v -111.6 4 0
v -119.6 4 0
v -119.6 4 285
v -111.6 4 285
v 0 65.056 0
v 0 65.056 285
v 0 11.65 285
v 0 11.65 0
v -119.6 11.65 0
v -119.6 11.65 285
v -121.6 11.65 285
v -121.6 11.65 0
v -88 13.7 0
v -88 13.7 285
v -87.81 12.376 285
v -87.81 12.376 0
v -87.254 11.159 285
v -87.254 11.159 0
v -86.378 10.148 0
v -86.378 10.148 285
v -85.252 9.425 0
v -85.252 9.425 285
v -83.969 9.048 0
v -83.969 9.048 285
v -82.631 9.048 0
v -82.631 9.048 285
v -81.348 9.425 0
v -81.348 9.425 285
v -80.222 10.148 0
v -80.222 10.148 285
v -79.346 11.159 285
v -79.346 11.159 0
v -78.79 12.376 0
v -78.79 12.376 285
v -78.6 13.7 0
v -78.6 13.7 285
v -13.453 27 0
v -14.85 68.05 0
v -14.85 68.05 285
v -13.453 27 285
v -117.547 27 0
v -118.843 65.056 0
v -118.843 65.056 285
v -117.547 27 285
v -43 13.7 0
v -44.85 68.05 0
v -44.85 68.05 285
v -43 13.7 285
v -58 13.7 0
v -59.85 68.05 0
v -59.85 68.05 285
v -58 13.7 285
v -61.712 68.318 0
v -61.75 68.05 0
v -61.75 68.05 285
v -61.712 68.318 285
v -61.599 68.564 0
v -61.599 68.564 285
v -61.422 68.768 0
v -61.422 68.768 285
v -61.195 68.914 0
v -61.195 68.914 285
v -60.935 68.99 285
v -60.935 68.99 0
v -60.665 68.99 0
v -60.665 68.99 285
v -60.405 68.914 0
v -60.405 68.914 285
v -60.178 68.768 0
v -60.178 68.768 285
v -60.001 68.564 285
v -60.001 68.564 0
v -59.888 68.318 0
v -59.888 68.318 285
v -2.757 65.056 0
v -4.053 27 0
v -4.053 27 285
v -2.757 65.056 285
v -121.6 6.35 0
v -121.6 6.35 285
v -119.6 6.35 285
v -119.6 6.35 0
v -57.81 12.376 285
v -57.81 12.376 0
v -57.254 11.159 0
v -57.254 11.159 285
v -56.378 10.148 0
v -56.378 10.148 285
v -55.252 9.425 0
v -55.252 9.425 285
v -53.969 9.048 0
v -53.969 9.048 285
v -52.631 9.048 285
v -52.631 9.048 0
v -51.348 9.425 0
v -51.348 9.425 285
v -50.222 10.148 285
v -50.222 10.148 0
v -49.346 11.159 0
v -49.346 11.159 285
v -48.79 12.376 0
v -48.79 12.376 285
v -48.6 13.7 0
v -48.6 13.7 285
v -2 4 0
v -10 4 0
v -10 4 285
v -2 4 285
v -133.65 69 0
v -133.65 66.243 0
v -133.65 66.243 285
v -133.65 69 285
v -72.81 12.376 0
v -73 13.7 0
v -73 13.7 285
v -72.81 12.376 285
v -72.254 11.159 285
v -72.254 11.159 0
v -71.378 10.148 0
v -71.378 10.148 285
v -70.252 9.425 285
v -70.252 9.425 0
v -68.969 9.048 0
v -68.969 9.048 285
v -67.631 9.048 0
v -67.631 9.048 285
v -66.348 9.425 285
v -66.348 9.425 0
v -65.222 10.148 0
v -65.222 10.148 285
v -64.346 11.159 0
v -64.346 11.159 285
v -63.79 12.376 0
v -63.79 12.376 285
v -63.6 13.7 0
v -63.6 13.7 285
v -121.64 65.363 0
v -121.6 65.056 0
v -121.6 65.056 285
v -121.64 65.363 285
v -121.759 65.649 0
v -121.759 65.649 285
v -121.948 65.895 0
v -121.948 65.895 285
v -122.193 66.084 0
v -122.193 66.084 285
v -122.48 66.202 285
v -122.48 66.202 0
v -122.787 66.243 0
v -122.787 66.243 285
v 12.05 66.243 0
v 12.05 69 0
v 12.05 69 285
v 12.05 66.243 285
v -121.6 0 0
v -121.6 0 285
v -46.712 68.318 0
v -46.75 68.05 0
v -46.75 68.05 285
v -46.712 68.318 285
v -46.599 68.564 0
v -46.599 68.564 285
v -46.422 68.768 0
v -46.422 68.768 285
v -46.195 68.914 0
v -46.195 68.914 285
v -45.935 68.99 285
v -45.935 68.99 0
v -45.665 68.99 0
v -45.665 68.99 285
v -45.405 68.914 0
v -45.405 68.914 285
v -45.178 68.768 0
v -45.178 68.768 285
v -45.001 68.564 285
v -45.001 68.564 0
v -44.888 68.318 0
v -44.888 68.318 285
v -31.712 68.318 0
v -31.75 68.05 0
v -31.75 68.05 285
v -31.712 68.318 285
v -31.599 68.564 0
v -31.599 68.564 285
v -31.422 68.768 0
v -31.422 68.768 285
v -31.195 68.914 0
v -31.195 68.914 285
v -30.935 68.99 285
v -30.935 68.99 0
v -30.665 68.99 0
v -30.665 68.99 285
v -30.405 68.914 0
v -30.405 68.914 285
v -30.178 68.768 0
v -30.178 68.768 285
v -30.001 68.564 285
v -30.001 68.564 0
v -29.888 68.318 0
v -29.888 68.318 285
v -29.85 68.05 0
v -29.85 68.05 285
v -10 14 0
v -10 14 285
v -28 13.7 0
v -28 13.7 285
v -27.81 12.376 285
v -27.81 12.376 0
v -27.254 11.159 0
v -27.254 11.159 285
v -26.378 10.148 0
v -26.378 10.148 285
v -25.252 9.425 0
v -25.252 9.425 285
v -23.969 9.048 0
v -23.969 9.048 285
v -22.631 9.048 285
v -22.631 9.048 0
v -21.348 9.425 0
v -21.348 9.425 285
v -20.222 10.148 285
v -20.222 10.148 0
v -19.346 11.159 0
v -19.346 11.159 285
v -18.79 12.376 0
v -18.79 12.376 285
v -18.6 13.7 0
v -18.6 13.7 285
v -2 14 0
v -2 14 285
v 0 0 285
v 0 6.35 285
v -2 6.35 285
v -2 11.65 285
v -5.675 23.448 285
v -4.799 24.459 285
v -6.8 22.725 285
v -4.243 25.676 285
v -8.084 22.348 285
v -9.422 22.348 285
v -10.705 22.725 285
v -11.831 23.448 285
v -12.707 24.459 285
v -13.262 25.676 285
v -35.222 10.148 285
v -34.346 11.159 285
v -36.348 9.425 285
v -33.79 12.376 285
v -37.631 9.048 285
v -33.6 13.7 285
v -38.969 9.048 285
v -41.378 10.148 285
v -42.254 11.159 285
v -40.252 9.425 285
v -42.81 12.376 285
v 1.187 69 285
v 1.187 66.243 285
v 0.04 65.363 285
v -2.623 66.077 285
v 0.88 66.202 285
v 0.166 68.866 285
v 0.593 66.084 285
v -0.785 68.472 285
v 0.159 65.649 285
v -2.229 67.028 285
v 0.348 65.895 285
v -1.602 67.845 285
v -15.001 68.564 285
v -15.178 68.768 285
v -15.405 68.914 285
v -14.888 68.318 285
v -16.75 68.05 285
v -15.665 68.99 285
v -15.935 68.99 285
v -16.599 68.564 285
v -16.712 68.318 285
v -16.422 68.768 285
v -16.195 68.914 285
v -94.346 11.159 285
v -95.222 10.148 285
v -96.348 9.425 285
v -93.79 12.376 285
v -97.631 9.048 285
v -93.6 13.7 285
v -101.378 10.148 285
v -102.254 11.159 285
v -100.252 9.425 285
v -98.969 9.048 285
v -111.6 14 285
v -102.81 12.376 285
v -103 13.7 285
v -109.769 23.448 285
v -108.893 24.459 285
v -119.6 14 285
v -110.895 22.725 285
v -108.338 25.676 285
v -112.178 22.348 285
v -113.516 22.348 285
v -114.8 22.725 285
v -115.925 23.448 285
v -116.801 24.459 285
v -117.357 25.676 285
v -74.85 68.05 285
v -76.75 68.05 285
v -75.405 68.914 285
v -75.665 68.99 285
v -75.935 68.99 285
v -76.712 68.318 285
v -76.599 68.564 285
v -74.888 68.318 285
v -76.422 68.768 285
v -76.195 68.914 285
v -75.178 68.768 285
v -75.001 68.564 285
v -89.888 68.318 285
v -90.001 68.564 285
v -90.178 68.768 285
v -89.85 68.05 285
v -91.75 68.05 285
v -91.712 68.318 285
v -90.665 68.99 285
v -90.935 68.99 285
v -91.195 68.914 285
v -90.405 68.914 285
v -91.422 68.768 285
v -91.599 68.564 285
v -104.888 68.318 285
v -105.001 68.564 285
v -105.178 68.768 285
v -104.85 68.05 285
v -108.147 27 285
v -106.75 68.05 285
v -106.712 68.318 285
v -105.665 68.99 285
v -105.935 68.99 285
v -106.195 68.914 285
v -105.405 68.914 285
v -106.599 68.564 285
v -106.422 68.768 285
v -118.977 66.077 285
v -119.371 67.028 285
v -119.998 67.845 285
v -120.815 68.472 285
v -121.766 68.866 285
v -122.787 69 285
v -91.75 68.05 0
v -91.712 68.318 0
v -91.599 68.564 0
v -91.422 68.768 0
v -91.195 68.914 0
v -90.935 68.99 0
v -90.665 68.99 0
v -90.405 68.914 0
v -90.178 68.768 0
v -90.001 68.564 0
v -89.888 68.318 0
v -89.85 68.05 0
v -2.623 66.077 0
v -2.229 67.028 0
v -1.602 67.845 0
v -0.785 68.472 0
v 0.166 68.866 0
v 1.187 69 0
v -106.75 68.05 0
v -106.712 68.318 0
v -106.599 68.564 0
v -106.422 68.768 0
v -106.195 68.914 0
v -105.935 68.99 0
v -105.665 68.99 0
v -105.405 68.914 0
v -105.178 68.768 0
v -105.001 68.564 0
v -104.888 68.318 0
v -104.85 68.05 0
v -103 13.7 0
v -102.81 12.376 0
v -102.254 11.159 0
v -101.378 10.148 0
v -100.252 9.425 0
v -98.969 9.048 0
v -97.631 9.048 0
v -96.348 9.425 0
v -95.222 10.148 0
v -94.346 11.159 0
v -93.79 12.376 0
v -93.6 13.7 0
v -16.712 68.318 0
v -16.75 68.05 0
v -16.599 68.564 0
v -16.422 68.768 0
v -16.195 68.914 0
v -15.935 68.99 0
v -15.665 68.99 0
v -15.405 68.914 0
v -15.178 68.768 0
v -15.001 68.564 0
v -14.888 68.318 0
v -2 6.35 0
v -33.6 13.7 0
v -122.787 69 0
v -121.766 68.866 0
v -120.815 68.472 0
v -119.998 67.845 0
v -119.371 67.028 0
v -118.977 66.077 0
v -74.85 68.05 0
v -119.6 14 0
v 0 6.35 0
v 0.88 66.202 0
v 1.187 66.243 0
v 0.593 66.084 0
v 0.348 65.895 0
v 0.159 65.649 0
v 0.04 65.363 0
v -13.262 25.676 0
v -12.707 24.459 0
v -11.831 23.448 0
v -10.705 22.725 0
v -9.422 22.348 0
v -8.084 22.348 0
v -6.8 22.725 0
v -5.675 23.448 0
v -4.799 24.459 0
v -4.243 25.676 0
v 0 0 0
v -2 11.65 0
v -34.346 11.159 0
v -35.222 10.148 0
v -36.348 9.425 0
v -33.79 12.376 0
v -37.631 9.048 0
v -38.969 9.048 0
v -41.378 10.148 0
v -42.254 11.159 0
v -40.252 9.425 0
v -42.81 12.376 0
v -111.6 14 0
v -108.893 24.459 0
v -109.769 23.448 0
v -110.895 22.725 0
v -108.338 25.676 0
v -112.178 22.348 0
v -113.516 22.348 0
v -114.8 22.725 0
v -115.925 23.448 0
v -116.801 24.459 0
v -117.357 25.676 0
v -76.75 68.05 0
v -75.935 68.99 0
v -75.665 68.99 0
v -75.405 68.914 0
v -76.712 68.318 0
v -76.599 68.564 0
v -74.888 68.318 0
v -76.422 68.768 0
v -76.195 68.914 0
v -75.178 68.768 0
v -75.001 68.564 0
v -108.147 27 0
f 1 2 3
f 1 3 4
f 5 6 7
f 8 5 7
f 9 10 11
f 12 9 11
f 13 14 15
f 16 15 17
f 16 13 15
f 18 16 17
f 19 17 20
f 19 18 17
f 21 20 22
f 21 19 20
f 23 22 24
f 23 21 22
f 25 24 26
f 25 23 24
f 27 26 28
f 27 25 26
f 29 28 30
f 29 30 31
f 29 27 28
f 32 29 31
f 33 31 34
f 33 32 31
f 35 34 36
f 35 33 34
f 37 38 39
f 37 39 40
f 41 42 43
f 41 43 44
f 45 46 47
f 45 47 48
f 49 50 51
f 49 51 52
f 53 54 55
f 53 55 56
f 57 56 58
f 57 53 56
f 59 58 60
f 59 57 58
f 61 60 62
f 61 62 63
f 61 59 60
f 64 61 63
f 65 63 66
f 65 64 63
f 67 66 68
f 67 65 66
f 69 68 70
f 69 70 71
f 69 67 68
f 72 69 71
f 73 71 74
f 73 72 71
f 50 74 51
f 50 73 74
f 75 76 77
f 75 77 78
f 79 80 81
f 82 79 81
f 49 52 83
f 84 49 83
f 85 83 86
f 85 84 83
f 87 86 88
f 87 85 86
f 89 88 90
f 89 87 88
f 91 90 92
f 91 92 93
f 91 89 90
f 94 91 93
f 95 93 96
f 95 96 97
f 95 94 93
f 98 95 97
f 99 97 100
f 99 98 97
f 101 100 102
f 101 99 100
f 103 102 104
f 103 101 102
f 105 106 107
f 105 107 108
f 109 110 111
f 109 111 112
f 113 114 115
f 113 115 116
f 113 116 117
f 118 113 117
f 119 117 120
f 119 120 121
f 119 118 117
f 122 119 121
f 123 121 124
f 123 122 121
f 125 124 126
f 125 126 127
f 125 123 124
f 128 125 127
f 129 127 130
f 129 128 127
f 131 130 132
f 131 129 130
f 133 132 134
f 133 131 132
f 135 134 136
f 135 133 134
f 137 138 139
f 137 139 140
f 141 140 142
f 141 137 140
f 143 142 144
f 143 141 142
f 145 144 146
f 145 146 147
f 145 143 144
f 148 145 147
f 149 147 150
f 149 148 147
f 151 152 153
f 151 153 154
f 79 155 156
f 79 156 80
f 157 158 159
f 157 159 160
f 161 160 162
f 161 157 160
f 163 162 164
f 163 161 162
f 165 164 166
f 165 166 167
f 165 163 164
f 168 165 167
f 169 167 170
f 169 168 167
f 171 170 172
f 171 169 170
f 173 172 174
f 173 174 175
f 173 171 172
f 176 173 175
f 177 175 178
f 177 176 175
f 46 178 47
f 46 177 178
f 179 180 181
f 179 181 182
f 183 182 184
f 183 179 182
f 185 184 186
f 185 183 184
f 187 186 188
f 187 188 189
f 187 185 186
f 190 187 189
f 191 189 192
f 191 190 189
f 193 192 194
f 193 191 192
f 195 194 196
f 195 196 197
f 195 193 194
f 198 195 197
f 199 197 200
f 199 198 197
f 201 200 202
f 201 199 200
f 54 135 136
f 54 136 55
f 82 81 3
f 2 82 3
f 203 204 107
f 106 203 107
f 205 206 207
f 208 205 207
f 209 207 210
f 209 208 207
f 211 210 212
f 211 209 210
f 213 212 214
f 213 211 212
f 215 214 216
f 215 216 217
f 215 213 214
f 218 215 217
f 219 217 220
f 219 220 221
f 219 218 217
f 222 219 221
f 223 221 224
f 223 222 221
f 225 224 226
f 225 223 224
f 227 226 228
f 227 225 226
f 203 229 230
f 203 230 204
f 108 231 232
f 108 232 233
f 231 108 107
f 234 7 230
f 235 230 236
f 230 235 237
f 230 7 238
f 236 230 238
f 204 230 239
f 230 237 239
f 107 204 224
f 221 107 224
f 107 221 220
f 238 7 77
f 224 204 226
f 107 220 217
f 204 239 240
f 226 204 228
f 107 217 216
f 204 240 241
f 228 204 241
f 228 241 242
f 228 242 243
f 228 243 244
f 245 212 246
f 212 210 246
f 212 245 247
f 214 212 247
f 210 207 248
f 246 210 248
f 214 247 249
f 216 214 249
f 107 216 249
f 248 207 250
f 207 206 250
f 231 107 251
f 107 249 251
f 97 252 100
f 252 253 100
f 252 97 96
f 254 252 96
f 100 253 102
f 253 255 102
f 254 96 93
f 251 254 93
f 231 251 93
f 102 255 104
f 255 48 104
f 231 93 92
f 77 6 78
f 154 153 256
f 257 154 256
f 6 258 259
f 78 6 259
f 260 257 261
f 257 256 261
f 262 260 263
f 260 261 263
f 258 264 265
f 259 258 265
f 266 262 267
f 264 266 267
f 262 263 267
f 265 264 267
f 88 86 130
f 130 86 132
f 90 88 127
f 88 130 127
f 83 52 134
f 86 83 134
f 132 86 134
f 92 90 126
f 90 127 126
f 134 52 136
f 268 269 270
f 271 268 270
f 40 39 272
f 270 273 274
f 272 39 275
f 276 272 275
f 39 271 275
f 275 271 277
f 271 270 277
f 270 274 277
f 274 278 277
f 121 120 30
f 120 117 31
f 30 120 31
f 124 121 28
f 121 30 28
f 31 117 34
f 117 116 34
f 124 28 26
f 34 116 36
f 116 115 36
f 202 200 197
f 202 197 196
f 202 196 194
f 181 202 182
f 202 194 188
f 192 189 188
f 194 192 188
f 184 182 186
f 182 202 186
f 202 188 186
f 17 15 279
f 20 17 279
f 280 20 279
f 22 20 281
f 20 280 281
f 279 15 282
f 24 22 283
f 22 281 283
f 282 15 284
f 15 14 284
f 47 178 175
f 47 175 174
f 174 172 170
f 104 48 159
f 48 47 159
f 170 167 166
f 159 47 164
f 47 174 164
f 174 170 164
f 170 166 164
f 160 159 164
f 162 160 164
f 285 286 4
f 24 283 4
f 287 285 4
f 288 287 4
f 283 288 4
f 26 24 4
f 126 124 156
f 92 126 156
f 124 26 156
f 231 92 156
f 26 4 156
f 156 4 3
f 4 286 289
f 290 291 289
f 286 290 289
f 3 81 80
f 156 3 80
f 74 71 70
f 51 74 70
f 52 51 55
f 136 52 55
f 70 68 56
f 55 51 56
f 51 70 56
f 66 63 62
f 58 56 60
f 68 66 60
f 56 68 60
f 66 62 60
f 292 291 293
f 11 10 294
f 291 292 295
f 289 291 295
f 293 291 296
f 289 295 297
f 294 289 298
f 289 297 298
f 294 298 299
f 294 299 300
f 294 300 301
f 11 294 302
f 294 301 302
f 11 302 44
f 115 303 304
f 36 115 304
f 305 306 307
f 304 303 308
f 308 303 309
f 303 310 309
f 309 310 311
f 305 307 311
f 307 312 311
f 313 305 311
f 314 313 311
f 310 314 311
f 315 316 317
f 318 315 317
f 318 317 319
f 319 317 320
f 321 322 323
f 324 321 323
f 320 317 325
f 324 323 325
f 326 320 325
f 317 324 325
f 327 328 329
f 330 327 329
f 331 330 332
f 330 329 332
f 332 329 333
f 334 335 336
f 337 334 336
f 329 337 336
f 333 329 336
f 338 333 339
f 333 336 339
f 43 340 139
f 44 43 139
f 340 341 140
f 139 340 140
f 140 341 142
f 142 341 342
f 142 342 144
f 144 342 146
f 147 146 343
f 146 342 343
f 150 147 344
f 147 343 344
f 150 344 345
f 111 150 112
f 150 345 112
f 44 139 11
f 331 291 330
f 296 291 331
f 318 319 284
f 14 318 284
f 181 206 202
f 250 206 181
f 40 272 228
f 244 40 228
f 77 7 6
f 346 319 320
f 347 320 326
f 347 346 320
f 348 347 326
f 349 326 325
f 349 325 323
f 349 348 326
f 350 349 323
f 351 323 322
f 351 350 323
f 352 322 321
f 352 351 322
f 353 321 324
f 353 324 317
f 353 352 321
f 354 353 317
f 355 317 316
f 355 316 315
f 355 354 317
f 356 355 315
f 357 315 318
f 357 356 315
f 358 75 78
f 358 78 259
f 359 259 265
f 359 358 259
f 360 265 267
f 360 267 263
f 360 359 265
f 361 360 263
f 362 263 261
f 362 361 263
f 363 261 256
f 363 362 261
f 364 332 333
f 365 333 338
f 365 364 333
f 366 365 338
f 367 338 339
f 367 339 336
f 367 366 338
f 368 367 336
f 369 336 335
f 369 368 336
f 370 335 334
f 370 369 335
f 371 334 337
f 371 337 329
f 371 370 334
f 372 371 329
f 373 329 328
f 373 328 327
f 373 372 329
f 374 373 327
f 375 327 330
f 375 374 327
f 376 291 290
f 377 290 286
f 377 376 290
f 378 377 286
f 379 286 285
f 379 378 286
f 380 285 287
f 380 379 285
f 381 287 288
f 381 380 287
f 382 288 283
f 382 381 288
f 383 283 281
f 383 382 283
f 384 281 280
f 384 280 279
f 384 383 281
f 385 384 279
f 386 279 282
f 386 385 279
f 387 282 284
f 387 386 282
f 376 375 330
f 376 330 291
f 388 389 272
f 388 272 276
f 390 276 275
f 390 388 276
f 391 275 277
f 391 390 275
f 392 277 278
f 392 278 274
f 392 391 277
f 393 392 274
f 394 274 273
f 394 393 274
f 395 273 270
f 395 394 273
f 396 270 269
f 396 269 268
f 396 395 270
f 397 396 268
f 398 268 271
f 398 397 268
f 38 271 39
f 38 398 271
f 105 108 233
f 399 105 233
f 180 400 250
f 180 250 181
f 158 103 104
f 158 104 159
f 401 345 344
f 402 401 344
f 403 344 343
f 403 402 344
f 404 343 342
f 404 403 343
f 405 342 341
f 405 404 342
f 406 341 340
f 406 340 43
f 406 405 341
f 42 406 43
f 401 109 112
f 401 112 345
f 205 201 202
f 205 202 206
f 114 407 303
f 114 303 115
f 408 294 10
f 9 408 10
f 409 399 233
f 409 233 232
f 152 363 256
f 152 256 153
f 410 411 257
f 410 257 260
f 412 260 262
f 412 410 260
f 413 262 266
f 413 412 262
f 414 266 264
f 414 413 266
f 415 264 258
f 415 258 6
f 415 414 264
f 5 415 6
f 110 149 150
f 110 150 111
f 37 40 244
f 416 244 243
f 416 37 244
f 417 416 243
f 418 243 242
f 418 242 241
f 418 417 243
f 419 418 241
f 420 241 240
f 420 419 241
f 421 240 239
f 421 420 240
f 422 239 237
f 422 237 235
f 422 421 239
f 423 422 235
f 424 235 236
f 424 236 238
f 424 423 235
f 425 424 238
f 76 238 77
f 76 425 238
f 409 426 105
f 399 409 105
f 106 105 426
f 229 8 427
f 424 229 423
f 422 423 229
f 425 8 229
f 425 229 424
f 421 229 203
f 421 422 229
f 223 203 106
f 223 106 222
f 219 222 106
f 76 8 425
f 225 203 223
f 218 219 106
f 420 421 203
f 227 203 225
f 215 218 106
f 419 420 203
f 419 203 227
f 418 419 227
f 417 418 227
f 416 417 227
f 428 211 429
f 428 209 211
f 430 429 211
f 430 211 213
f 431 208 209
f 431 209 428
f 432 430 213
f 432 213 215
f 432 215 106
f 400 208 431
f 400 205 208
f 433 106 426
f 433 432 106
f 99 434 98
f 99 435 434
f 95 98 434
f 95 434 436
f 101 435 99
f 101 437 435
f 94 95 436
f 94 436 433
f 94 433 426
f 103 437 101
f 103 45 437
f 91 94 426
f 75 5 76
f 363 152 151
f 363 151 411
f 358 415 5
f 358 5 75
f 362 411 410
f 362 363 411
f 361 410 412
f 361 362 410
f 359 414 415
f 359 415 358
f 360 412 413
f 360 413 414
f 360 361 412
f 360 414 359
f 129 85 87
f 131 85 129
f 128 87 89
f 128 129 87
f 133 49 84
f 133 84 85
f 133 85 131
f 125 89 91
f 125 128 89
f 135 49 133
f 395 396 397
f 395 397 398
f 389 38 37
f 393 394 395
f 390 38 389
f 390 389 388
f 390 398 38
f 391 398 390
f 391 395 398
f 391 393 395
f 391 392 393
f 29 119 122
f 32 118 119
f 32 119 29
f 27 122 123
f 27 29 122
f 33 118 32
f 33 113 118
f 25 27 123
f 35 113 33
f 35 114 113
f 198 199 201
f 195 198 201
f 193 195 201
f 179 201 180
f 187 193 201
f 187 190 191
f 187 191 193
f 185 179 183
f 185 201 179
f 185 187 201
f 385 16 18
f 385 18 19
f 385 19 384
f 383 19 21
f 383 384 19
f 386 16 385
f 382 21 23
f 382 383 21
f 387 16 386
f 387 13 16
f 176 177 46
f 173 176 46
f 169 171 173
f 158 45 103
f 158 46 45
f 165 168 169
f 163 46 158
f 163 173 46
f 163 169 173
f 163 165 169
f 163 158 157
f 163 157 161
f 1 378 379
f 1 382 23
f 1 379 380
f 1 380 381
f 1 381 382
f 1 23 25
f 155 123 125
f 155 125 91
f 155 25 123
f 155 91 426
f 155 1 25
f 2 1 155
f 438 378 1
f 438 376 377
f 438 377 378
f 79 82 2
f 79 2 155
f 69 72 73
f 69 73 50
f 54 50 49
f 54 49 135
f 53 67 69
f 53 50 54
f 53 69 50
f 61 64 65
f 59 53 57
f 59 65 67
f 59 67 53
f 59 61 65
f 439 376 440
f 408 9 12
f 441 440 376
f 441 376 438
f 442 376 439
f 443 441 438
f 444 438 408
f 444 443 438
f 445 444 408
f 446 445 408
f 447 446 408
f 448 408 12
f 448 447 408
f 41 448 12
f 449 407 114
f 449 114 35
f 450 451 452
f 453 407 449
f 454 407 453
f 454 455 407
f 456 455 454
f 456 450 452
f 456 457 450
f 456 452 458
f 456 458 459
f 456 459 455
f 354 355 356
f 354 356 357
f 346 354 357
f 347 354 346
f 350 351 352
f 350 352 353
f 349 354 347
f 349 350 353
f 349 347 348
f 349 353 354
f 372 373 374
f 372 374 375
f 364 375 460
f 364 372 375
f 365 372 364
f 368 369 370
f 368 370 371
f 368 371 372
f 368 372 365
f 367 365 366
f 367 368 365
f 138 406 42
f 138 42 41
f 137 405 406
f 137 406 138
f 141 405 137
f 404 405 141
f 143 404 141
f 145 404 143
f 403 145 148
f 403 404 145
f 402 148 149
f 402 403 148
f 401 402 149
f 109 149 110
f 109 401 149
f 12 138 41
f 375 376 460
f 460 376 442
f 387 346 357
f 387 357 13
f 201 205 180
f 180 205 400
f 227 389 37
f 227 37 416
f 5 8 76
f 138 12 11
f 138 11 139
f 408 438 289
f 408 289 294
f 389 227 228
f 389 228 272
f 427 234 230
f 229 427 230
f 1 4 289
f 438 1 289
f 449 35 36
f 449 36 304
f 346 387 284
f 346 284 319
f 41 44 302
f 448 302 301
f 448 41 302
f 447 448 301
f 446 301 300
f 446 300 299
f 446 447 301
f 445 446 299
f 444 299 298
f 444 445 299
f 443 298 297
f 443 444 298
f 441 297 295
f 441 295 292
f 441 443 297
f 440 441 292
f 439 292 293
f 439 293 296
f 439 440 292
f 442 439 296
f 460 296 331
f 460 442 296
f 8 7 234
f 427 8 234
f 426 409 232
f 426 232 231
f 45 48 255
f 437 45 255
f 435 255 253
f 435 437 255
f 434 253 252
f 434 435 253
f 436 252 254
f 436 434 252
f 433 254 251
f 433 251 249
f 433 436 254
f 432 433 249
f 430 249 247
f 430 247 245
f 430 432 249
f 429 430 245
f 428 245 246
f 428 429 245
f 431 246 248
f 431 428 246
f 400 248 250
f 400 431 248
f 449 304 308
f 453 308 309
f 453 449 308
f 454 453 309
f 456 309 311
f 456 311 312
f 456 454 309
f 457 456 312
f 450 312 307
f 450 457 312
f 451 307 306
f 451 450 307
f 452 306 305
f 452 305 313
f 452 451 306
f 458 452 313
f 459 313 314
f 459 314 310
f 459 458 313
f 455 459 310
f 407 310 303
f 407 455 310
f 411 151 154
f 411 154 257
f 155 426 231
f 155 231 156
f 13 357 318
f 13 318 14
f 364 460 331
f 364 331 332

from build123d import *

# Parameters (mm, degrees)
RESSALTO_EXTRUS_O1_DEPTH = 285


with BuildPart() as part:
    # Esboço1 → Ressalto-extrusão1 (new body)
    with BuildSketch(Plane.XY):
        with BuildLine():
            Line((0, 0), (-121.6, 0))
            Line((-121.6, 0), (-121.6, 6.35))
            Line((-121.6, 6.35), (-119.6, 6.35))
            Line((-119.6, 6.35), (-119.6, 4))
            Line((-119.6, 4), (-111.6, 4))
            Line((-111.6, 4), (-111.6, 14))
            Line((-111.6, 14), (-119.6, 14))
            Line((-119.6, 14), (-119.6, 11.65))
            Line((-119.6, 11.65), (-121.6, 11.65))
            Line((-121.6, 11.65), (-121.6, 65.055990081))
            ThreePointArc((-121.6, 65.055990081), (-121.94756763, 65.895092566), (-122.786670115, 66.242660196))
            Line((-122.786670115, 66.242660196), (-133.65, 66.242660196))
            Line((-133.65, 66.242660196), (-133.65, 69))
            Line((-133.65, 69), (-122.786670115, 69))
            ThreePointArc((-122.786670115, 69), (-119.997833956, 67.84482624), (-118.842660196, 65.055990081))
            Line((-118.842660196, 65.055990081), (-117.547286109, 27))
            ThreePointArc((-117.547286109, 27), (-112.847286109, 22.3), (-108.147286109, 27))
            Line((-108.147286109, 27), (-106.75, 68.05))
            ThreePointArc((-106.75, 68.05), (-105.8, 69), (-104.85, 68.05))
            Line((-104.85, 68.05), (-103, 13.7))
            ThreePointArc((-103, 13.7), (-98.3, 9), (-93.6, 13.7))
            Line((-93.6, 13.7), (-91.75, 68.05))
            ThreePointArc((-91.75, 68.05), (-90.8, 69), (-89.85, 68.05))
            Line((-89.85, 68.05), (-88, 13.7))
            ThreePointArc((-88, 13.7), (-83.3, 9), (-78.6, 13.7))
            Line((-78.6, 13.7), (-76.75, 68.05))
            ThreePointArc((-76.75, 68.05), (-75.8, 69), (-74.85, 68.05))
            Line((-74.85, 68.05), (-73, 13.7))
            ThreePointArc((-73, 13.7), (-68.3, 9), (-63.6, 13.7))
            Line((-63.6, 13.7), (-61.75, 68.05))
            ThreePointArc((-61.75, 68.05), (-60.8, 69), (-59.85, 68.05))
            Line((-59.85, 68.05), (-58, 13.7))
            ThreePointArc((-58, 13.7), (-53.3, 9), (-48.6, 13.7))
            Line((-48.6, 13.7), (-46.75, 68.05))
            ThreePointArc((-46.75, 68.05), (-45.8, 69), (-44.85, 68.05))
            Line((-44.85, 68.05), (-43, 13.7))
            ThreePointArc((-43, 13.7), (-38.3, 9), (-33.6, 13.7))
            Line((-33.6, 13.7), (-31.75, 68.05))
            ThreePointArc((-31.75, 68.05), (-30.8, 69), (-29.85, 68.05))
            Line((-29.85, 68.05), (-28, 13.7))
            ThreePointArc((-28, 13.7), (-23.3, 9), (-18.6, 13.7))
            Line((-18.6, 13.7), (-16.75, 68.05))
            ThreePointArc((-16.75, 68.05), (-15.8, 69), (-14.85, 68.05))
            Line((-14.85, 68.05), (-13.452713891, 27))
            ThreePointArc((-13.452713891, 27), (-8.752713891, 22.3), (-4.052713891, 27))
            Line((-4.052713891, 27), (-2.757339804, 65.055990081))
            ThreePointArc((-2.757339804, 65.055990081), (-1.602166044, 67.84482624), (1.186670115, 69))
            Line((1.186670115, 69), (12.05, 69))
            Line((12.05, 69), (12.05, 66.242660196))
            Line((12.05, 66.242660196), (1.186670115, 66.242660196))
            ThreePointArc((1.186670115, 66.242660196), (0.34756763, 65.895092566), (0, 65.055990081))
            Line((0, 65.055990081), (0, 11.65))
            Line((0, 11.65), (-2, 11.65))
            Line((-2, 11.65), (-2, 14))
            Line((-2, 14), (-10, 14))
            Line((-10, 14), (-10, 4))
            Line((-10, 4), (-2, 4))
            Line((-2, 4), (-2, 6.35))
            Line((-2, 6.35), (0, 6.35))
            Line((0, 6.35), (0, 0))
        make_face()
    extrude(amount=RESSALTO_EXTRUS_O1_DEPTH)


solid = part.part
